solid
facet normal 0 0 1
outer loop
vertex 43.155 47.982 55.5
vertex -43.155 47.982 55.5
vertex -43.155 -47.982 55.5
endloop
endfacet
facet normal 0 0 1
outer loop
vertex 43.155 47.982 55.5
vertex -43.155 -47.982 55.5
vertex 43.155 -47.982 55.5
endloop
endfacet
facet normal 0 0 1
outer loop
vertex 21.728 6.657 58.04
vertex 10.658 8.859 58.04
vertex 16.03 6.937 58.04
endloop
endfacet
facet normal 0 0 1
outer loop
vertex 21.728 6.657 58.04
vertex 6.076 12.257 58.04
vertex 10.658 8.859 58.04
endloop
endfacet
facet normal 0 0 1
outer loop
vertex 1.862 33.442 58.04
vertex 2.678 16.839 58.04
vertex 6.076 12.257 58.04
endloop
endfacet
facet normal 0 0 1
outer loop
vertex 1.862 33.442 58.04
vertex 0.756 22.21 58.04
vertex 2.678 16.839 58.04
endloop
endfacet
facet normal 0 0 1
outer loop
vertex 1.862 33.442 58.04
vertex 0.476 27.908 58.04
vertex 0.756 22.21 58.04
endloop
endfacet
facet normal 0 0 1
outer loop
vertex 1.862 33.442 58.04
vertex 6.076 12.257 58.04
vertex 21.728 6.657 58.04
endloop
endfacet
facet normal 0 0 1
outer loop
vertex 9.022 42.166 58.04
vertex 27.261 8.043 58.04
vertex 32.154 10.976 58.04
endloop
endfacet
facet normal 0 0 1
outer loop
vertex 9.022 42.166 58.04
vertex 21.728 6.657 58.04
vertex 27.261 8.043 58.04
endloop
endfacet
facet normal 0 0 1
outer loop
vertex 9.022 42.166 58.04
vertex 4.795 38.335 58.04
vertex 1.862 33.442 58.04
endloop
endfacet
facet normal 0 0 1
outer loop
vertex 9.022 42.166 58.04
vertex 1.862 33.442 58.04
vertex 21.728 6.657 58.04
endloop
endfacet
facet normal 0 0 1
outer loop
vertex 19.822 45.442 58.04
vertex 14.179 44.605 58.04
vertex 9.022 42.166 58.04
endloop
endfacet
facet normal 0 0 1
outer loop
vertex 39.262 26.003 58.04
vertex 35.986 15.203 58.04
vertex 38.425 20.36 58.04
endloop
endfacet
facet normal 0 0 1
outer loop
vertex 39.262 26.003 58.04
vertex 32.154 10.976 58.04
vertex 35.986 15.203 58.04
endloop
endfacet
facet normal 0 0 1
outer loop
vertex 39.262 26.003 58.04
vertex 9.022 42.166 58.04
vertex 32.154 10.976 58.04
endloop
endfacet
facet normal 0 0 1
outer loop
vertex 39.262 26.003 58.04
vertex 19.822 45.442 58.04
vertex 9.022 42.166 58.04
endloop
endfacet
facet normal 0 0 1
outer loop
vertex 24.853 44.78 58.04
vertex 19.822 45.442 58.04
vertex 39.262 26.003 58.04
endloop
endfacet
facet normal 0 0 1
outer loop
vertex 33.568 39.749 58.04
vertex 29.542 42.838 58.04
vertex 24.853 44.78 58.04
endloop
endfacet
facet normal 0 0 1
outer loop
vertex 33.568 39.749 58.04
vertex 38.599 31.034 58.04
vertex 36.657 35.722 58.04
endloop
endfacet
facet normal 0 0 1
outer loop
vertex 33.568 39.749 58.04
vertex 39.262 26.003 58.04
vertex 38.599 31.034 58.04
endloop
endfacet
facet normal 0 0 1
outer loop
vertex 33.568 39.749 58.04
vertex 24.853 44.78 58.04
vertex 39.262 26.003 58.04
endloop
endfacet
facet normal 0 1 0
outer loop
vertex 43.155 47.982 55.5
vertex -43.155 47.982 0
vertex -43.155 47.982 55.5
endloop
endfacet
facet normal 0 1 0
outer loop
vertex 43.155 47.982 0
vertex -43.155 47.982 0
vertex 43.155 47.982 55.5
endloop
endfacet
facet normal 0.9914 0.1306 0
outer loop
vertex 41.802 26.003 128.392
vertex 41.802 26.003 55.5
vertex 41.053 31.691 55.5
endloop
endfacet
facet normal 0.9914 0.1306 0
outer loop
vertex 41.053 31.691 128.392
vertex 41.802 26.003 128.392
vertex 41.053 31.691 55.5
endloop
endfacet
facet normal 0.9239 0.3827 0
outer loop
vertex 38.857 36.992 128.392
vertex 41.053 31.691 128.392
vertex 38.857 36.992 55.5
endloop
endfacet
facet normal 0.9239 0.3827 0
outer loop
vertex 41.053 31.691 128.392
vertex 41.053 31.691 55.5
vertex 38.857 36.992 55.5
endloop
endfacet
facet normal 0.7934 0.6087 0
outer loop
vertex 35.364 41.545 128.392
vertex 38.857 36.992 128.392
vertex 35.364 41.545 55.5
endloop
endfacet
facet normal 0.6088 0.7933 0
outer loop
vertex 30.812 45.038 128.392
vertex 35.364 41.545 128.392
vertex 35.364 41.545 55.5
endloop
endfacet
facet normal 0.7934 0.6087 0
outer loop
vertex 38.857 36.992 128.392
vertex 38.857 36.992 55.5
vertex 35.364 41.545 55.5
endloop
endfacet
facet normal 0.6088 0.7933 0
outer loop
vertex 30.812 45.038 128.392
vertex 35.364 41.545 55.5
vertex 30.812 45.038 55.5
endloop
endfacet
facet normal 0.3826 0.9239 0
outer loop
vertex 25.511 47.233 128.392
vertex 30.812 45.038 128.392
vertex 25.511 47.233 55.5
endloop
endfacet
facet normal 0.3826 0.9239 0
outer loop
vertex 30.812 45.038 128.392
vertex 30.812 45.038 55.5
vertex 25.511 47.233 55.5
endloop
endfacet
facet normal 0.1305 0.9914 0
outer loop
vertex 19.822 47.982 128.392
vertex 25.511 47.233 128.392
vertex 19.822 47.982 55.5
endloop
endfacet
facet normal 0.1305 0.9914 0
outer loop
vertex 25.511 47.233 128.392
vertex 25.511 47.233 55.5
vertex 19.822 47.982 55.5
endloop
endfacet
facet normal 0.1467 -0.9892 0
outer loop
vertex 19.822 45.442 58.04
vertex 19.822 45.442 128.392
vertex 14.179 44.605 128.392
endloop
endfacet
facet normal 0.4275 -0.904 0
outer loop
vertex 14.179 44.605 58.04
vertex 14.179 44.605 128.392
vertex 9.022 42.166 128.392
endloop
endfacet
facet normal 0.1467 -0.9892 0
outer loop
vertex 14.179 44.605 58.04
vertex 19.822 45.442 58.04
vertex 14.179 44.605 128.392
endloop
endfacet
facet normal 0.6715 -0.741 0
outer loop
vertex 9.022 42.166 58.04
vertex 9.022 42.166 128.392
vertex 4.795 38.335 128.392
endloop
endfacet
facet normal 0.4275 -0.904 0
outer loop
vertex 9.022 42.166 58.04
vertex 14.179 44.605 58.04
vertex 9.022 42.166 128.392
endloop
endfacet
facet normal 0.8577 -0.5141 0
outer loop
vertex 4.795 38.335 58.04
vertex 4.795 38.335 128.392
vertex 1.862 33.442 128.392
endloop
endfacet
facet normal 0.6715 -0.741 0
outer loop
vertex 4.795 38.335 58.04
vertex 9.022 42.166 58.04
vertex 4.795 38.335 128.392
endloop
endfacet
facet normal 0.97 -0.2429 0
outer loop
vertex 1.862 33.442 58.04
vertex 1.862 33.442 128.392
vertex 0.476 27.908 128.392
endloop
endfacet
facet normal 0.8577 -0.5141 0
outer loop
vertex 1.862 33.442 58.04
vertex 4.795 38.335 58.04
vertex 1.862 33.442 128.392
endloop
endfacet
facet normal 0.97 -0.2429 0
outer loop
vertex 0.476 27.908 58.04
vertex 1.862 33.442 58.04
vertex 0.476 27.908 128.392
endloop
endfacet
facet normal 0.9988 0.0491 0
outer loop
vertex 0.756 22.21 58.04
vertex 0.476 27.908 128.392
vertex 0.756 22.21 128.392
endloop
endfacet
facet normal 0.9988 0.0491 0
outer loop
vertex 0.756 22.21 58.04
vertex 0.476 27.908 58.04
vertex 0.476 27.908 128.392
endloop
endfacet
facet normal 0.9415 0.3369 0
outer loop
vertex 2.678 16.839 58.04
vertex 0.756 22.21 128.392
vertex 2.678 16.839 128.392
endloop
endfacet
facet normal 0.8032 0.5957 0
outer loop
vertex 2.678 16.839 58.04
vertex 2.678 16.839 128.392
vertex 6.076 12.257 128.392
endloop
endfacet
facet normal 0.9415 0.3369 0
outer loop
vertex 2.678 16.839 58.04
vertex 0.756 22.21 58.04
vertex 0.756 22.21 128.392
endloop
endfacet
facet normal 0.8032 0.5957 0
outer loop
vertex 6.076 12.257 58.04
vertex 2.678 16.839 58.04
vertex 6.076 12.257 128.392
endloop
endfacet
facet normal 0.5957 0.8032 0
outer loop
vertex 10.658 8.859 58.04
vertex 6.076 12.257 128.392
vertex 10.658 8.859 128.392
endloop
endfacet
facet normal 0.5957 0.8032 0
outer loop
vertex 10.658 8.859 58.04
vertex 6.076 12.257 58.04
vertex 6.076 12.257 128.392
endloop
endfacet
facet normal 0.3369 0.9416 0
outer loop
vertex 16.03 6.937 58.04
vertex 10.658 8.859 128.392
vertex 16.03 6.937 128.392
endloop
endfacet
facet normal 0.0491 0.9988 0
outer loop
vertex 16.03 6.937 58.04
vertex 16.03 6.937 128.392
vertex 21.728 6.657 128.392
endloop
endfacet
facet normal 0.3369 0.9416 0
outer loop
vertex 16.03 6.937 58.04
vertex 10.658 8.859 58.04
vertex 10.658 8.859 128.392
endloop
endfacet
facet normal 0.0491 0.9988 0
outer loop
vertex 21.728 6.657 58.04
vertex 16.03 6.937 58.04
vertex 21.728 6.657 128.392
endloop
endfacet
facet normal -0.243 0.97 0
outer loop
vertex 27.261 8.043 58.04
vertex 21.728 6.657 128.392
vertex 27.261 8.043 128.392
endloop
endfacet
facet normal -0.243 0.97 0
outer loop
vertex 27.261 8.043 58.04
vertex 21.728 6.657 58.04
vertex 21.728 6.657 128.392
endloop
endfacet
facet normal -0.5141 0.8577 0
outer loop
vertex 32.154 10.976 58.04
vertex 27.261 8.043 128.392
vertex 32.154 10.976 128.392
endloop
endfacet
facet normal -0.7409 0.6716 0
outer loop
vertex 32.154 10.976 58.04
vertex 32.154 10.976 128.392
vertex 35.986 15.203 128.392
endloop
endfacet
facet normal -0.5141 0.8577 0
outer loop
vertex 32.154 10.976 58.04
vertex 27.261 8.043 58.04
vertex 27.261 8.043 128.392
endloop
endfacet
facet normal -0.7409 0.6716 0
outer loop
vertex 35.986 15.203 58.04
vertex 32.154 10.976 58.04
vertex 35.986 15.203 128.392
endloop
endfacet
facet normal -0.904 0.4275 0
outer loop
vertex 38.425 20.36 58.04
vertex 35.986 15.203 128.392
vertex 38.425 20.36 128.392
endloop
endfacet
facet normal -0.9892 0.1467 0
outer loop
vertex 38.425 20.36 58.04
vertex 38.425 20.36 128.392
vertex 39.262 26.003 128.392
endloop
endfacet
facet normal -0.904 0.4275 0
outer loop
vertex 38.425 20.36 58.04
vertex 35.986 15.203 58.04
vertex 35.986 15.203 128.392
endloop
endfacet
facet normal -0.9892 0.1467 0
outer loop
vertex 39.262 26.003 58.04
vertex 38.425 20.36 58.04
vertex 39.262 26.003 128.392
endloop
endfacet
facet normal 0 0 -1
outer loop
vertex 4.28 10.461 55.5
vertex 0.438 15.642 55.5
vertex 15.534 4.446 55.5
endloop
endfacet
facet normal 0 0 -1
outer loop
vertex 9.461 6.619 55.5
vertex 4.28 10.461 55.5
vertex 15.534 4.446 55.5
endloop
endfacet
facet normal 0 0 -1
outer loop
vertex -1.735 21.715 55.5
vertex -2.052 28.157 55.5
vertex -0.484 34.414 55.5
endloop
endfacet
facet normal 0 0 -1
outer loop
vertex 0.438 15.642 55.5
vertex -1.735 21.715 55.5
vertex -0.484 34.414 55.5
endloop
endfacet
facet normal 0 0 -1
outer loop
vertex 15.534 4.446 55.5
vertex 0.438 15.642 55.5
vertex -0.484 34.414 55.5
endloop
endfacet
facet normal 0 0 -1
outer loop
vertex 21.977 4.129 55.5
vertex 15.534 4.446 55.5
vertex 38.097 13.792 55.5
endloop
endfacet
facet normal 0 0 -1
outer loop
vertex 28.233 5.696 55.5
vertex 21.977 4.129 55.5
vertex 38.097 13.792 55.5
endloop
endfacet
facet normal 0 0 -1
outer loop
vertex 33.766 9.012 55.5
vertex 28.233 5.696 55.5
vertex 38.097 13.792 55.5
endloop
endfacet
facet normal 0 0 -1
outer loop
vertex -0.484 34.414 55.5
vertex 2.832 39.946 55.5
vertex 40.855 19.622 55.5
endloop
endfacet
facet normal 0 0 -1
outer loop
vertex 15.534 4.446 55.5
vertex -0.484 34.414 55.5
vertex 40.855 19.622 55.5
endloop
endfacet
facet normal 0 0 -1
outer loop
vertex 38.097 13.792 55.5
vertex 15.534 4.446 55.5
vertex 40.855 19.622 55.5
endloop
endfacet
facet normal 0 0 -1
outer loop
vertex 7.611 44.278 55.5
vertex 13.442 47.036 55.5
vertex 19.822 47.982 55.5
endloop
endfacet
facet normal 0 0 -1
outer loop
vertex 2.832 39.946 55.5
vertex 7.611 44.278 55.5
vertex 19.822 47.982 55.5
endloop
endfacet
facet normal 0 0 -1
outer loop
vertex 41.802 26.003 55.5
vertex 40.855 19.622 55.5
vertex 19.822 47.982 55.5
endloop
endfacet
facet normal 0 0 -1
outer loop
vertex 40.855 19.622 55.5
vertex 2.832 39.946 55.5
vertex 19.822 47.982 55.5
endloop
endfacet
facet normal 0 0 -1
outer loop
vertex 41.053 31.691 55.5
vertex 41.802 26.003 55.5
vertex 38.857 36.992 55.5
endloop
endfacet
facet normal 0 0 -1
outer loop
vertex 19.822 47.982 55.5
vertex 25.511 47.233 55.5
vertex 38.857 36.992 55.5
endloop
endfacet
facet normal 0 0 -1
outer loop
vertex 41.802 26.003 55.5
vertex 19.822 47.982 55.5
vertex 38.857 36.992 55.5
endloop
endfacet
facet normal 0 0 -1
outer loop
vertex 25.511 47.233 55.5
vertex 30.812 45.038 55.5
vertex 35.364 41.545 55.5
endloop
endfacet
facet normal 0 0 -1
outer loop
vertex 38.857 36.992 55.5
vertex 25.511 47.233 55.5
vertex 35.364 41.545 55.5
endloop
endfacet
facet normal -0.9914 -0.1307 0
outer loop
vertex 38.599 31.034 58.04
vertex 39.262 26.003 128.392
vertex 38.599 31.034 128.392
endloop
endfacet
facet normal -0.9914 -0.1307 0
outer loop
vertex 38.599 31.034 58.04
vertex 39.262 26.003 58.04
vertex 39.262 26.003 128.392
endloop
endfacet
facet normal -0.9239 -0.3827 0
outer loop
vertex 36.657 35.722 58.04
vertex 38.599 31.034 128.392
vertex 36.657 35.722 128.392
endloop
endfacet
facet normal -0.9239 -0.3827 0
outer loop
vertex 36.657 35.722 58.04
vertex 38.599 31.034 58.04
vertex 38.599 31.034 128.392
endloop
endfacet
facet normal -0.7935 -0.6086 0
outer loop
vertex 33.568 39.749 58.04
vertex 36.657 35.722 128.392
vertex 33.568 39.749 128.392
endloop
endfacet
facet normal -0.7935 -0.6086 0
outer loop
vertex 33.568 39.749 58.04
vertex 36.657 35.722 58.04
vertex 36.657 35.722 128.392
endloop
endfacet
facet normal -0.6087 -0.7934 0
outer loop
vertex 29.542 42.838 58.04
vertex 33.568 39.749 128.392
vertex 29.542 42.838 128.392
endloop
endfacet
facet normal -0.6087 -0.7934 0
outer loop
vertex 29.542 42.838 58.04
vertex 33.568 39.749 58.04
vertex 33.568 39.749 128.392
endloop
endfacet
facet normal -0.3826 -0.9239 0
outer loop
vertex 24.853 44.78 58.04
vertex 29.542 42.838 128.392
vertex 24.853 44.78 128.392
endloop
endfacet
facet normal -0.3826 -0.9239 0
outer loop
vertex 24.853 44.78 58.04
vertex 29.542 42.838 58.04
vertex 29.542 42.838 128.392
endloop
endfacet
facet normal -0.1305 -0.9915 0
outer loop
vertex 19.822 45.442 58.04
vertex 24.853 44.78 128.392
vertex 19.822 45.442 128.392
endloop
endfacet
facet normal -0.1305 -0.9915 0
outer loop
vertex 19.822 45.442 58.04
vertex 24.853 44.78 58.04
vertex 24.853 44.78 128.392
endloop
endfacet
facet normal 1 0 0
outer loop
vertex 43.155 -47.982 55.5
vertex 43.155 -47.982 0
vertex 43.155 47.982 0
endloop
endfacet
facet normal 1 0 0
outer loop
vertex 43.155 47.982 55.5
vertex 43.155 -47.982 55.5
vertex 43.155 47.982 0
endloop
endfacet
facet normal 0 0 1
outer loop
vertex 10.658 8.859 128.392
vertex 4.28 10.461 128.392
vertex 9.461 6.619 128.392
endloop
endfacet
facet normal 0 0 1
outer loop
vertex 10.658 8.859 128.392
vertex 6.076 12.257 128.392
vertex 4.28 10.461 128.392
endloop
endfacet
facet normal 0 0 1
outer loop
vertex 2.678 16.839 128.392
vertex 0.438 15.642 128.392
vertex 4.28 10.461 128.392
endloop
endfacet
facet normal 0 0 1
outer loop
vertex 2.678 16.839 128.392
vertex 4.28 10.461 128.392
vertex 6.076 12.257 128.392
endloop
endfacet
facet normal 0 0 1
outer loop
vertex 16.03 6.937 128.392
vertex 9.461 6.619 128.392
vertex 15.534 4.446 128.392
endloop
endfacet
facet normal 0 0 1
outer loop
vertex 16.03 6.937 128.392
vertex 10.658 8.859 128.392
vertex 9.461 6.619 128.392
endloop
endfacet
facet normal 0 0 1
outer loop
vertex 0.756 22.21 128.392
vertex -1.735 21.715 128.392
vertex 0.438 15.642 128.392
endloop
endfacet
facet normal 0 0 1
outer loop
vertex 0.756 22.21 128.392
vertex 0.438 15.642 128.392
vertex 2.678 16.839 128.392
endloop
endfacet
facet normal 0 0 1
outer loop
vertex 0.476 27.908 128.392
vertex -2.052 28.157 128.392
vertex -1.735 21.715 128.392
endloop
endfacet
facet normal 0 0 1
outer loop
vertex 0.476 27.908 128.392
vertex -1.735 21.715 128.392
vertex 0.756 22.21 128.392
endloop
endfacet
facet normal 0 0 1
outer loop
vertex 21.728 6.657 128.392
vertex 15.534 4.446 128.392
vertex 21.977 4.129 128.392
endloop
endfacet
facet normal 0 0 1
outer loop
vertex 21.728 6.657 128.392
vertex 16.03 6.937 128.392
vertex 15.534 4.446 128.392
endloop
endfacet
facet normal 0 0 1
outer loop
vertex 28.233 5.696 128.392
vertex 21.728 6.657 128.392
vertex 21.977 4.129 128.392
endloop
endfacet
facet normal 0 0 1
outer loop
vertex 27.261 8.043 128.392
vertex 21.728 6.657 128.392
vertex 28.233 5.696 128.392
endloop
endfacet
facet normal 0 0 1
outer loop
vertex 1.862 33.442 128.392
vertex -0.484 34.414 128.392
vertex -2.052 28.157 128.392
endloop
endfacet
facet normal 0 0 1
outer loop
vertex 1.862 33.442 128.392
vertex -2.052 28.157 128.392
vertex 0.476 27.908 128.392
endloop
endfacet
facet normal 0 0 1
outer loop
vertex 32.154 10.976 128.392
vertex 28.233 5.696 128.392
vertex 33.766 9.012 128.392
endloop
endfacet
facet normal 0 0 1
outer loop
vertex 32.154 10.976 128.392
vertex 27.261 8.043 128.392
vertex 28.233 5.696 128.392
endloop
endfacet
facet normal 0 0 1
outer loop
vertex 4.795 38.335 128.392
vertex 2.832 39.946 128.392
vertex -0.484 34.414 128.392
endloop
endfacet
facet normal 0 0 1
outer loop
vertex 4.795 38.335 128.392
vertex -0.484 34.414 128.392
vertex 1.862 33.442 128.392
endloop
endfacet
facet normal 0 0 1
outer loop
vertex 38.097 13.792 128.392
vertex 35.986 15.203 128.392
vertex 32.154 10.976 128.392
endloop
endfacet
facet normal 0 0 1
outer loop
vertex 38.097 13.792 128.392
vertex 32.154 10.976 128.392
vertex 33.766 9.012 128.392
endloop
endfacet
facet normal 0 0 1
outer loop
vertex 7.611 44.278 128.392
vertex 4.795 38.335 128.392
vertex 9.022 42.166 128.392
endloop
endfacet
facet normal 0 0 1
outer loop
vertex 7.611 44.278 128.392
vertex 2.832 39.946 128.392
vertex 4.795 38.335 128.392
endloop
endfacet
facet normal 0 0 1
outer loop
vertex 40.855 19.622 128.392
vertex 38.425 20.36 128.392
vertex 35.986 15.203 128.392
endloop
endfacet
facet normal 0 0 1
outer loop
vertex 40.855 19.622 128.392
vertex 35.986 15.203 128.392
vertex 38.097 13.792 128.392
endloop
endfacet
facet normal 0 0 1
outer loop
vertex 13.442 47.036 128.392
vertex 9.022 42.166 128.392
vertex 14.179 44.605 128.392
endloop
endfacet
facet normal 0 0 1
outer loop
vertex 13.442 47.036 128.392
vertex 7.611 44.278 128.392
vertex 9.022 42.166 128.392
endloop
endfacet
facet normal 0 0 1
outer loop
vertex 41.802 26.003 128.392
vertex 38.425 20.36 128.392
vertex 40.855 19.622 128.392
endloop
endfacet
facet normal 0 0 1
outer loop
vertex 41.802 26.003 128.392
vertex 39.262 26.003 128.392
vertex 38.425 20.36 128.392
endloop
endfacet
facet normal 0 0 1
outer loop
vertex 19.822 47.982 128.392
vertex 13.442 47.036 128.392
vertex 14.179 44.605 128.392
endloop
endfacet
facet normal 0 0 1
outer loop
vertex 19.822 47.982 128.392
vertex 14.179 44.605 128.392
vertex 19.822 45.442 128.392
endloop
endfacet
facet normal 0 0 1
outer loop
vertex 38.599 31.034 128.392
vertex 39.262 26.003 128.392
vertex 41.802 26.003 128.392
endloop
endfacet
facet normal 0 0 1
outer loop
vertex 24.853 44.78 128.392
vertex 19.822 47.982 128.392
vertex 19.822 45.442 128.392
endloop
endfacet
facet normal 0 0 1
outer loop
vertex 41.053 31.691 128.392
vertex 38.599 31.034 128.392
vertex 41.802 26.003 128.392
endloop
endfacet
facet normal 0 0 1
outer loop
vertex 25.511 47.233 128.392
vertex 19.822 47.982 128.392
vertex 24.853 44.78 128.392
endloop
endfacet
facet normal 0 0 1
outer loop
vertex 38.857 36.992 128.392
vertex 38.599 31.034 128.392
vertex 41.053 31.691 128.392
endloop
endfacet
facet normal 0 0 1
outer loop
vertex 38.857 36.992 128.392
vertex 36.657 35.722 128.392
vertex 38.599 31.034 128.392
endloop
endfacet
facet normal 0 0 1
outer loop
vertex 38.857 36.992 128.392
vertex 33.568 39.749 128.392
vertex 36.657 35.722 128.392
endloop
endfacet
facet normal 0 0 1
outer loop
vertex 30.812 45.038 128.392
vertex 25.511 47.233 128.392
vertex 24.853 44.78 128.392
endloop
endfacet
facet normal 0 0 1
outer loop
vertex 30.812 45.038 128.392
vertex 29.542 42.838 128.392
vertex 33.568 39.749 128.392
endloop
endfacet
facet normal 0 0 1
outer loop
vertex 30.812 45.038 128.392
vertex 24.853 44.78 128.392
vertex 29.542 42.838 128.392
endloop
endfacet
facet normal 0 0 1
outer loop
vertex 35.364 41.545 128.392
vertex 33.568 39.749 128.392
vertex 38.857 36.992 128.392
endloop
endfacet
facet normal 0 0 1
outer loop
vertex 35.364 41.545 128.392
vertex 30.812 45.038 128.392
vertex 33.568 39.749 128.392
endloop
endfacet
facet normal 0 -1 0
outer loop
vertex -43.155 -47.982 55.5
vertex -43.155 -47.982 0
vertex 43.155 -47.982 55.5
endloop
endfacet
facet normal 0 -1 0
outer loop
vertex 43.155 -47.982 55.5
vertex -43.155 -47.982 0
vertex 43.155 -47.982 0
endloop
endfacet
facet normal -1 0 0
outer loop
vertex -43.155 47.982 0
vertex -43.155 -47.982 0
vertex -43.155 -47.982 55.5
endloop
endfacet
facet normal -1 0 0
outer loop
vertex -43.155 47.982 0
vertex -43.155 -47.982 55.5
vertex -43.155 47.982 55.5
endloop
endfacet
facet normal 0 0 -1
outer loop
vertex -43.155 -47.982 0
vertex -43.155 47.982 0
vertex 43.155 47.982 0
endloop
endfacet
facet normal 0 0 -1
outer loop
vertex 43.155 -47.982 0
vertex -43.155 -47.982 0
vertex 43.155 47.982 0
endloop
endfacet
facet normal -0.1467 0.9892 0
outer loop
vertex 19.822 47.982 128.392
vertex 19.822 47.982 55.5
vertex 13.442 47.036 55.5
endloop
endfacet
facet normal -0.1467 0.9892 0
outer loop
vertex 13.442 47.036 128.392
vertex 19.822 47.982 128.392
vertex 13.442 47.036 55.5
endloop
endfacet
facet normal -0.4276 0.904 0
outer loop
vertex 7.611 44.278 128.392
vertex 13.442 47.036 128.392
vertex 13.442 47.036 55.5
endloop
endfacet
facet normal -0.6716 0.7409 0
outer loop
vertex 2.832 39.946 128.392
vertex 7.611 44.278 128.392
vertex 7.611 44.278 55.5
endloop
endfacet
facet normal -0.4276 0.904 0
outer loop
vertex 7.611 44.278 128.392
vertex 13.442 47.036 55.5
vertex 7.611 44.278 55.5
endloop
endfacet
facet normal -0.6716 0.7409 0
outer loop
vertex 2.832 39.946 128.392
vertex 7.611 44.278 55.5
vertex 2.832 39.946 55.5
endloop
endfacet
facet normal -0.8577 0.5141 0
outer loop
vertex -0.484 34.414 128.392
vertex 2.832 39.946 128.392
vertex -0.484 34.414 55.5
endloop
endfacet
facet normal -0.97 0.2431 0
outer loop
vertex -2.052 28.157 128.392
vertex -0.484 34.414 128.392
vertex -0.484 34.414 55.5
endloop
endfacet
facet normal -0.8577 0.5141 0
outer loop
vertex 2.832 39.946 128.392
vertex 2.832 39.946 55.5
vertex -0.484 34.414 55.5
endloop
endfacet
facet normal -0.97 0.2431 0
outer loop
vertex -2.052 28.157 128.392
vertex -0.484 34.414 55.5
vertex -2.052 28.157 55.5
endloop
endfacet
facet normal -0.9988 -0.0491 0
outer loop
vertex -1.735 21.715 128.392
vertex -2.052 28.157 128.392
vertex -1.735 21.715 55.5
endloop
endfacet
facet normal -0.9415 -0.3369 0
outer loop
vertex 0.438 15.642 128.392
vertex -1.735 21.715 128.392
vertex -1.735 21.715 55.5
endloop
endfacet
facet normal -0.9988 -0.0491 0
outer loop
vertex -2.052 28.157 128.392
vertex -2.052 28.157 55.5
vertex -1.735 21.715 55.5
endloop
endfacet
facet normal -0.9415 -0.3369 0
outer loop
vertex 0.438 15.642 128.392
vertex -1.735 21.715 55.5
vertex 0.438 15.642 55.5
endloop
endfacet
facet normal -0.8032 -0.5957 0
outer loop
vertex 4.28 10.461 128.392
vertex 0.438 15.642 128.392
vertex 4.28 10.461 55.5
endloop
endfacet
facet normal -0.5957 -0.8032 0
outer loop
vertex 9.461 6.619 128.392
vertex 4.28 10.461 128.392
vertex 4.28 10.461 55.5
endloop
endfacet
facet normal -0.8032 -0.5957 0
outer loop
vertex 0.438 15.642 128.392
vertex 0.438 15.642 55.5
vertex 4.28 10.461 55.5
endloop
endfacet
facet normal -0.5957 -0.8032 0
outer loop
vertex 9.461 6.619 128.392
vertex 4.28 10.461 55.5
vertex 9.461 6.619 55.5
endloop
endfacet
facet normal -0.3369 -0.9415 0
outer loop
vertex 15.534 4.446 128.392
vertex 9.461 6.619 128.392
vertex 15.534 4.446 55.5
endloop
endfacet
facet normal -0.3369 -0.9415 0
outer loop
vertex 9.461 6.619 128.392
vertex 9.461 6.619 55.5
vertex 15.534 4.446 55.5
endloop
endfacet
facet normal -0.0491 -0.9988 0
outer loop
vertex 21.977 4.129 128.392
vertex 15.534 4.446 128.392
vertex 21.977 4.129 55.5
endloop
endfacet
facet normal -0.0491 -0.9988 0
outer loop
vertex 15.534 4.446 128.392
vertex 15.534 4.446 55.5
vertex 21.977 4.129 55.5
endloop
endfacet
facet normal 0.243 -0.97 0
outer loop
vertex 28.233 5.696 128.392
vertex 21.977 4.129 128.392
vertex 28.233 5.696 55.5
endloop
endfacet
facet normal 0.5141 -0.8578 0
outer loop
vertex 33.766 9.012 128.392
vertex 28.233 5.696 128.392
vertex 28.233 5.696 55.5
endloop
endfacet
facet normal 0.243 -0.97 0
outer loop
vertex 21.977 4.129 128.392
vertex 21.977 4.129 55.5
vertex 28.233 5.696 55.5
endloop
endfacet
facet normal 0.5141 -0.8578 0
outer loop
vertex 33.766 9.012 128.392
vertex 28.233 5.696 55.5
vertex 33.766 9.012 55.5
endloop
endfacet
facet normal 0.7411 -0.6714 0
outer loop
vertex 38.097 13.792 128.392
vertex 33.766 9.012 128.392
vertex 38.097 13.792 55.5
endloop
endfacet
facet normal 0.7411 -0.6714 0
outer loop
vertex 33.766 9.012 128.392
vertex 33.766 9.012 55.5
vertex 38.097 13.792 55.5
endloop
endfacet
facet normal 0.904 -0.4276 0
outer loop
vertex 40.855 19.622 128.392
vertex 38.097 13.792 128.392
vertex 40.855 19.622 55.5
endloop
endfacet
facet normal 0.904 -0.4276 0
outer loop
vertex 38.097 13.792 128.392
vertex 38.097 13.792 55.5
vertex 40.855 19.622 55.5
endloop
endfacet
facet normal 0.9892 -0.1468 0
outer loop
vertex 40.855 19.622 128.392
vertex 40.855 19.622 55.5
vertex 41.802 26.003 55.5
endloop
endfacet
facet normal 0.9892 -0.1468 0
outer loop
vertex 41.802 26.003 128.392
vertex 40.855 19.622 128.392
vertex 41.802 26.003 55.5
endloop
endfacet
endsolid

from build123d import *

# Parameters (mm, degrees)
F1_W     = 86.309158
F1_H     = 95.964536
F2_DEPTH = 55.499502
F4_DEPTH = 72.892174
F5_T     = -2.54


with BuildPart() as f2:
    # F1 (on face) → F2 (new body)
    with BuildSketch(Plane.XY):
        Rectangle(F1_W, F1_H)
    extrude(amount=F2_DEPTH)


with BuildPart() as f4:
    # F3 (on face) → F4 (new body)
    with BuildSketch(Plane.XY.offset(55.499502)):
        with BuildLine():
            ThreePointArc((19.822143, 47.982268), (4.28026, 10.460842), (41.801685, 26.002726))
            ThreePointArc((41.801685, 26.002726), (35.364027, 41.544609), (19.822143, 47.982268))
        make_face()
    extrude(amount=F4_DEPTH)

    # F5
    f5_openings = [f4.faces().sort_by_distance(p)[0] for p in [
        (19.822143, 26.002726, 128.391676),
    ]]
    offset(amount=F5_T, openings=f5_openings)


solid = Compound([f2.part, f4.part])
